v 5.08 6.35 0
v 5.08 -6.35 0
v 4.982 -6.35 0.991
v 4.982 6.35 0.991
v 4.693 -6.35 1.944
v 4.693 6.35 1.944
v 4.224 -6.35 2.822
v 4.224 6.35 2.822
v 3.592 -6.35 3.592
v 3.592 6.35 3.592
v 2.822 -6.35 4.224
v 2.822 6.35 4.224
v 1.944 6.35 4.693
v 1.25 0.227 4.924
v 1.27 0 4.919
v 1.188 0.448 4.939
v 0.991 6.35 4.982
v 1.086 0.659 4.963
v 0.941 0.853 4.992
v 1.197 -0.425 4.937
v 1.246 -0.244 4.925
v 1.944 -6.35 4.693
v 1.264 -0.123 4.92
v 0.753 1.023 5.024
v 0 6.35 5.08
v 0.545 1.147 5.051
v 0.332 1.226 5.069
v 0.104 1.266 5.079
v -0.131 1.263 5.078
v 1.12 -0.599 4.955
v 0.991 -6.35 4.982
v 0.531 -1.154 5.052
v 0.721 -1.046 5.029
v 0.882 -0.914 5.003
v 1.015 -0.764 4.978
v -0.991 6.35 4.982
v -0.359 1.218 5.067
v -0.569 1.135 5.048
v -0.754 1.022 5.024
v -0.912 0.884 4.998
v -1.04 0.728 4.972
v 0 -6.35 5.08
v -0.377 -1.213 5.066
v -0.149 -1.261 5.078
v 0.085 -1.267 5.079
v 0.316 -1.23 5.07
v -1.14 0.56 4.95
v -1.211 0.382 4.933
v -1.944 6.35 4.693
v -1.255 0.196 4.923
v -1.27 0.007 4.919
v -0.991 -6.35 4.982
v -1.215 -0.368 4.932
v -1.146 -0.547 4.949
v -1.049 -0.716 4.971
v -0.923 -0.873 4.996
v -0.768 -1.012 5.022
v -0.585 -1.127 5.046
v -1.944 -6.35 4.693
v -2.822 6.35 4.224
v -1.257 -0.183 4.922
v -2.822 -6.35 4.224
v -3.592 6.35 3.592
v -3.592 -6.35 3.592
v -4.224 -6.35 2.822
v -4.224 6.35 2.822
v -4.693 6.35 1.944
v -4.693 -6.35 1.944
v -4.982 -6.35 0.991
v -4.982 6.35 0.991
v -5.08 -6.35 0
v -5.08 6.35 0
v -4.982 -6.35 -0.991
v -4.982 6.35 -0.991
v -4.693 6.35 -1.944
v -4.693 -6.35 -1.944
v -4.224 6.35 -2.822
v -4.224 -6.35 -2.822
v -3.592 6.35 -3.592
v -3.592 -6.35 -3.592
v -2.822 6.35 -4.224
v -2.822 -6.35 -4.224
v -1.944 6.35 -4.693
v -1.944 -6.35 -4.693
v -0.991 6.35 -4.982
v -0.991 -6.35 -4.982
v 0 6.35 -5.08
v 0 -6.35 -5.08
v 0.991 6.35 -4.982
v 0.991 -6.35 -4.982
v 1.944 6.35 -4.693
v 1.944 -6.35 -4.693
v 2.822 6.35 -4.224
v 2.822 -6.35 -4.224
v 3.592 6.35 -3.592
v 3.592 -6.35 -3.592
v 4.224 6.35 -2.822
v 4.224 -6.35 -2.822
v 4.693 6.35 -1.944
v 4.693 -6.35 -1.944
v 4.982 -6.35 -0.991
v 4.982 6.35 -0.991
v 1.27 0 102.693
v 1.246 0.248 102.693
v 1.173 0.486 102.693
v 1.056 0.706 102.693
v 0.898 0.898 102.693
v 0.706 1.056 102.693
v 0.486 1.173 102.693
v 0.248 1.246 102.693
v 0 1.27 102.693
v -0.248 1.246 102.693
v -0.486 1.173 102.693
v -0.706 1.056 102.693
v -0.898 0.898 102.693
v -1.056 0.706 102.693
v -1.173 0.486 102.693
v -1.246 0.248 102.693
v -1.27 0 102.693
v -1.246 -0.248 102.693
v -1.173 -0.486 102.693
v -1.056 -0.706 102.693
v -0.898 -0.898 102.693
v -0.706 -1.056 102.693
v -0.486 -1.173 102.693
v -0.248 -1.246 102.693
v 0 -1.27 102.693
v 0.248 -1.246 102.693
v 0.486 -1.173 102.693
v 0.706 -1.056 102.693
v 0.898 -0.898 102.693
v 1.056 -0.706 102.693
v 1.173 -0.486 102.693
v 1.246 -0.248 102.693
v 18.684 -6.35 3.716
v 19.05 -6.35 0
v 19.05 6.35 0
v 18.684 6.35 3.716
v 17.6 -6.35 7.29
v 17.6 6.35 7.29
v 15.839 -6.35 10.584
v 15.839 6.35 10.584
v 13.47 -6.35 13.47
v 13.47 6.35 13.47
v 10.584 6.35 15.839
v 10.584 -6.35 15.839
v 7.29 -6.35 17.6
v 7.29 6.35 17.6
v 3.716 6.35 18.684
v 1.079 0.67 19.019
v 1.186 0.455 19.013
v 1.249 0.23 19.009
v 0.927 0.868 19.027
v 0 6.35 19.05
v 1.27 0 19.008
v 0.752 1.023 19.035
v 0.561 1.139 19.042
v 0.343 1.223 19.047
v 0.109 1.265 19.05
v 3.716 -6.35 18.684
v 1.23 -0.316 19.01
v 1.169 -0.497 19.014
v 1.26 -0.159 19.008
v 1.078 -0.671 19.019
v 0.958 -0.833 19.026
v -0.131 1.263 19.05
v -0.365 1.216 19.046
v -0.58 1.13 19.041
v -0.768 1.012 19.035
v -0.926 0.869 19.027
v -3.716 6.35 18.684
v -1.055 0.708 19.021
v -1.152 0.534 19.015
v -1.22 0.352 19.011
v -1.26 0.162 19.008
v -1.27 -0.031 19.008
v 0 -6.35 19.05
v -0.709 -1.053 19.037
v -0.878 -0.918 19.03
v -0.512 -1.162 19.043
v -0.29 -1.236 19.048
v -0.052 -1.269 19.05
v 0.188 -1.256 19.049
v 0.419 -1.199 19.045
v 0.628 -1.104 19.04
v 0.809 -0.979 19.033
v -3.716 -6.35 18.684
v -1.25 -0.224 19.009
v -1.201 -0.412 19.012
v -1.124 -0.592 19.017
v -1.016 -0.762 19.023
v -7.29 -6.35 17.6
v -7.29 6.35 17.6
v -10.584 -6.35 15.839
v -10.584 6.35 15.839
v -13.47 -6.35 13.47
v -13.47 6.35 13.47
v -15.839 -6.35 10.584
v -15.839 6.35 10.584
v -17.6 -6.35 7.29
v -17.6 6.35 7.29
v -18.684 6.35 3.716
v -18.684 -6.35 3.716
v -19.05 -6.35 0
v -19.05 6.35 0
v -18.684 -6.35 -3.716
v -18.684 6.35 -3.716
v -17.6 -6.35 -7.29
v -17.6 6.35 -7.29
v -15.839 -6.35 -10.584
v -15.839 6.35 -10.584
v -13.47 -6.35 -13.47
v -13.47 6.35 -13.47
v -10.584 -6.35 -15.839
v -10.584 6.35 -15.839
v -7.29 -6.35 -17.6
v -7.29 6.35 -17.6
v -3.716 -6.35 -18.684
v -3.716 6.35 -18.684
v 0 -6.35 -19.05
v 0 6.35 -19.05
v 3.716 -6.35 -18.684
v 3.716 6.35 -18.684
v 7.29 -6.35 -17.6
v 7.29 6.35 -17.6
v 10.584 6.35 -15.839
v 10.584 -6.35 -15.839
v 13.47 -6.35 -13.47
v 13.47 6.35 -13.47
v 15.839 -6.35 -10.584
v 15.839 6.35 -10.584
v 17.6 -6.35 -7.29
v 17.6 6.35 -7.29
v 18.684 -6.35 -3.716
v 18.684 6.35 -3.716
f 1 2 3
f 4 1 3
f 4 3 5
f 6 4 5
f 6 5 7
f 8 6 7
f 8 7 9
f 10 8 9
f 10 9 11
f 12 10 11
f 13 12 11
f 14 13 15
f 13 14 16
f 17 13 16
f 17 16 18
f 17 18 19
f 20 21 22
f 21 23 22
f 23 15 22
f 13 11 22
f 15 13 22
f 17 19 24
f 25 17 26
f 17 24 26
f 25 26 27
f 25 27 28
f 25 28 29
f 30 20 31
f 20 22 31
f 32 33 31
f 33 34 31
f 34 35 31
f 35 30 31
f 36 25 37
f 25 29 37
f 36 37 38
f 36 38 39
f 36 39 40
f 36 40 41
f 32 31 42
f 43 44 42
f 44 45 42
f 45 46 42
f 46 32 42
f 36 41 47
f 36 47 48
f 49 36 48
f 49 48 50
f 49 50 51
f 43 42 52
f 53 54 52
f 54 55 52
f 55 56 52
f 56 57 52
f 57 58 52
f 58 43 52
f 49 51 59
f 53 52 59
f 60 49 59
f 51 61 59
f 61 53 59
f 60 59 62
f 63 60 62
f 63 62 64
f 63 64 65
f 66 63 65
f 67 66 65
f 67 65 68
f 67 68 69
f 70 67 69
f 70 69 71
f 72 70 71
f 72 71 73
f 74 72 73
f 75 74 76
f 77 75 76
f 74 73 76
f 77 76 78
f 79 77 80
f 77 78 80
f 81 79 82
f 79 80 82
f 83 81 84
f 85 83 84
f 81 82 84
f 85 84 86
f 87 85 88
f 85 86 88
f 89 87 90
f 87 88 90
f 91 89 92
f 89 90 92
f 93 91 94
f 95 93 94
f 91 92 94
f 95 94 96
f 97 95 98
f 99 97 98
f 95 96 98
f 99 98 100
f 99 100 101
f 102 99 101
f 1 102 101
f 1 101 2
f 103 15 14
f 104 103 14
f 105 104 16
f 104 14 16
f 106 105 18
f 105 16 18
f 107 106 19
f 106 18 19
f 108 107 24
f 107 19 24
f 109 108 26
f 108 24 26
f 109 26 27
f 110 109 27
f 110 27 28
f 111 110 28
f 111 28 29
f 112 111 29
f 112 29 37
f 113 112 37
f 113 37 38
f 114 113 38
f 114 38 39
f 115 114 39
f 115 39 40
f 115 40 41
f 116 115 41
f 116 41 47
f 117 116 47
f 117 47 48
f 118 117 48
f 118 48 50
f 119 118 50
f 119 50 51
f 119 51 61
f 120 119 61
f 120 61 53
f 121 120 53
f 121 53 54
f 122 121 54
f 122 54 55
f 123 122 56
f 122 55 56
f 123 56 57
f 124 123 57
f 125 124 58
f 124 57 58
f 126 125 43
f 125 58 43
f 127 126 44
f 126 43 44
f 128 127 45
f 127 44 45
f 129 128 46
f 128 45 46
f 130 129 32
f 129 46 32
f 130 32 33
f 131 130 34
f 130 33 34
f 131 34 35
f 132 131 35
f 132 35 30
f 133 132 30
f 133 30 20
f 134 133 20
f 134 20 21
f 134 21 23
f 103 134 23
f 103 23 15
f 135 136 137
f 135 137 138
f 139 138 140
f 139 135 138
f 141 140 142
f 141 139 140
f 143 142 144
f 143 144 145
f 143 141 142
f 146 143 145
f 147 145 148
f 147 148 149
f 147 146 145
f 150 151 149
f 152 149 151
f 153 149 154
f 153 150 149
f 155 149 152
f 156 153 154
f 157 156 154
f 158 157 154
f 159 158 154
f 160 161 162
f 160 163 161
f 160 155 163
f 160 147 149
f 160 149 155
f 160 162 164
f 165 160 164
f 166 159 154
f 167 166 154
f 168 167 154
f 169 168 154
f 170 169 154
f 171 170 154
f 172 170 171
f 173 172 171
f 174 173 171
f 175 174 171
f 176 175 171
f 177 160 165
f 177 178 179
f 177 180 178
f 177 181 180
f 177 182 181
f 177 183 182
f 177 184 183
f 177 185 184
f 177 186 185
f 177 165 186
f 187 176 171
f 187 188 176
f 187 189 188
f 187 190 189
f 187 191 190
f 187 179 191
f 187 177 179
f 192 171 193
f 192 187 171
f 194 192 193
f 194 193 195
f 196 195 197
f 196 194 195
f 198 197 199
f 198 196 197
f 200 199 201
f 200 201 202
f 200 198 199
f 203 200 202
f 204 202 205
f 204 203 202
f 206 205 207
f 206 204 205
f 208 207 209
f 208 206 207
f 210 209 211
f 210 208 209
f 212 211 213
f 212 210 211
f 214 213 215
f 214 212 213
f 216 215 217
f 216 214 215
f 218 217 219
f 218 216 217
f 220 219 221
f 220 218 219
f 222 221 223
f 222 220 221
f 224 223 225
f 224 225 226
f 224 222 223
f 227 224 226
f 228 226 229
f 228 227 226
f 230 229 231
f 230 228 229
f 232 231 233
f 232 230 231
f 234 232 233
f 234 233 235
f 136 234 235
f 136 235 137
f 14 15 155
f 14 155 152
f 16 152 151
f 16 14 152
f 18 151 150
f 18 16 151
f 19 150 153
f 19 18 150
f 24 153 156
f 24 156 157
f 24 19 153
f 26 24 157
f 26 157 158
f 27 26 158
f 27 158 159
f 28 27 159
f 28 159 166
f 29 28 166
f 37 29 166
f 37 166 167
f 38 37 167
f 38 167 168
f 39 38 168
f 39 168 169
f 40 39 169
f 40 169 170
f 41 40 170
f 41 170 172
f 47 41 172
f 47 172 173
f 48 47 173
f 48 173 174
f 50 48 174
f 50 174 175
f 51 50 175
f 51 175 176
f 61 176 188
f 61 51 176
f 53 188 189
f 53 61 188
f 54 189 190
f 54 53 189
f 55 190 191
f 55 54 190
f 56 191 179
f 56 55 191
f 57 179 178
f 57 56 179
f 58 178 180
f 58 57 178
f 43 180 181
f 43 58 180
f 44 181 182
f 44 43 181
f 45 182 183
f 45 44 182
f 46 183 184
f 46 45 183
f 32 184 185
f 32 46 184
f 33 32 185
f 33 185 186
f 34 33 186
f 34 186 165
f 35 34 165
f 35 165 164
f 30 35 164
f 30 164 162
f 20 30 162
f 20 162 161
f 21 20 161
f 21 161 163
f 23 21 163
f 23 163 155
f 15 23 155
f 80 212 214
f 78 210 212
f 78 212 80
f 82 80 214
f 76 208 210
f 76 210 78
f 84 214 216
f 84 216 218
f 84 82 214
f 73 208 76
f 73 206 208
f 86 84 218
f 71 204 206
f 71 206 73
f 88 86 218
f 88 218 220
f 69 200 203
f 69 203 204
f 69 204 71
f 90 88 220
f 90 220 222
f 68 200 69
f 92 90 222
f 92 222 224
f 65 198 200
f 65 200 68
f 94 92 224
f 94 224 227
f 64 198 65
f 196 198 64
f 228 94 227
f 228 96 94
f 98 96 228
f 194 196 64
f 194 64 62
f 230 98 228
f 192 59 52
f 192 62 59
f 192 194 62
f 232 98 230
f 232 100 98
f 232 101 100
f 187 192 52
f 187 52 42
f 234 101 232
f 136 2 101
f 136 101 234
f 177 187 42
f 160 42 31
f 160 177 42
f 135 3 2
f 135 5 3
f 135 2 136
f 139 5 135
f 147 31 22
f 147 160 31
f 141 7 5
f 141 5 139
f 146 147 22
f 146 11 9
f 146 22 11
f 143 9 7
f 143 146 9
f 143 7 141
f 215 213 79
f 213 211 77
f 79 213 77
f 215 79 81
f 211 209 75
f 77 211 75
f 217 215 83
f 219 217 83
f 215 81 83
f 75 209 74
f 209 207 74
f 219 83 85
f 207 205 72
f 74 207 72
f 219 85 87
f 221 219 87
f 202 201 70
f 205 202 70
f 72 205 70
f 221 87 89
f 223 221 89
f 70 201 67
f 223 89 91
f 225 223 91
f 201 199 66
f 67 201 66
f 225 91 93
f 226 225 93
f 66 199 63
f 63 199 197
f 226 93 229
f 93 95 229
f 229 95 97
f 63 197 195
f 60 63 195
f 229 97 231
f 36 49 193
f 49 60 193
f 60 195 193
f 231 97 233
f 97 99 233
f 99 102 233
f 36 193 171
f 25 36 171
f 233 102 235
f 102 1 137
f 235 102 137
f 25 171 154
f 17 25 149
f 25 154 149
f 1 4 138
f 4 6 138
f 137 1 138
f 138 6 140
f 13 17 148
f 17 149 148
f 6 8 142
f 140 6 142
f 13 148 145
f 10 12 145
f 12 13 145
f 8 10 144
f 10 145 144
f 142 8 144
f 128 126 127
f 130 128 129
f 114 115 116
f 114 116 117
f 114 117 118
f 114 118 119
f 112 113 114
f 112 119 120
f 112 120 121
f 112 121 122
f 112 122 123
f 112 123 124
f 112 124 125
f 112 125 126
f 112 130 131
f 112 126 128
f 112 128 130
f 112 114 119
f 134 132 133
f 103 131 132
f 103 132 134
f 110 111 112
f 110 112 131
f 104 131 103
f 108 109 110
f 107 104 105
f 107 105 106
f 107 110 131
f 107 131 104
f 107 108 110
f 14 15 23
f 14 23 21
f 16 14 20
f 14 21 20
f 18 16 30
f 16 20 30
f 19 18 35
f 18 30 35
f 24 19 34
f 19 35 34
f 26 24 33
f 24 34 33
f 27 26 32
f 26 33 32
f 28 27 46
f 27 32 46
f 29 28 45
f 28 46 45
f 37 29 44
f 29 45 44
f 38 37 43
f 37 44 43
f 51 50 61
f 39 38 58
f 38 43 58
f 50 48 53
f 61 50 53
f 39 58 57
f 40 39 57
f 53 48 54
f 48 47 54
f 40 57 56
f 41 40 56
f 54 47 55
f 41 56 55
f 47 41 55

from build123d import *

# Parameters (mm, degrees)
F3_R     = 19.05
F4_DEPTH = 6.35
F5_R     = 1.27
F6_DEPTH = 102.6929366
F7_R     = 5.08
F8_DEPTH = 12.701
F9_DEPTH = 109.0429366


# Not quite as in the source:
# - the program builds the solid bodies; features that only make, move or delete a surface that nothing else refers to are left out


with BuildPart() as f4:
    # F3 (on face) → F4 (new body, symmetric)
    with BuildSketch(Plane.XZ):
        Circle(F3_R)
    extrude(amount=F4_DEPTH, both=True)


with BuildPart() as f6:
    # F5 (on Top) → F6 (new body)
    with BuildSketch(Plane.XY):
        Circle(F5_R)
    extrude(amount=F6_DEPTH)


with BuildPart() as f8_tool:
    # F7 (on face) → F8 (new body, through all)
    with BuildSketch(Plane.XZ.offset(6.35)):
        Circle(F7_R)
    extrude(amount=-F8_DEPTH)


with BuildPart() as f4_1:
    add(f4.part)

    # F8: cut by f8_tool
    add(f8_tool.part, mode=Mode.SUBTRACT)

    # F5 (on Top) → F9 (cut)
    with BuildSketch(Plane.XY):
        Circle(F5_R)
    extrude(amount=F9_DEPTH, mode=Mode.SUBTRACT)


with BuildPart() as f6_1:
    add(f6.part)

    # F8: cut by f8_tool
    add(f8_tool.part, mode=Mode.SUBTRACT)


solid = Compound([f4_1.part, f6_1.part])
